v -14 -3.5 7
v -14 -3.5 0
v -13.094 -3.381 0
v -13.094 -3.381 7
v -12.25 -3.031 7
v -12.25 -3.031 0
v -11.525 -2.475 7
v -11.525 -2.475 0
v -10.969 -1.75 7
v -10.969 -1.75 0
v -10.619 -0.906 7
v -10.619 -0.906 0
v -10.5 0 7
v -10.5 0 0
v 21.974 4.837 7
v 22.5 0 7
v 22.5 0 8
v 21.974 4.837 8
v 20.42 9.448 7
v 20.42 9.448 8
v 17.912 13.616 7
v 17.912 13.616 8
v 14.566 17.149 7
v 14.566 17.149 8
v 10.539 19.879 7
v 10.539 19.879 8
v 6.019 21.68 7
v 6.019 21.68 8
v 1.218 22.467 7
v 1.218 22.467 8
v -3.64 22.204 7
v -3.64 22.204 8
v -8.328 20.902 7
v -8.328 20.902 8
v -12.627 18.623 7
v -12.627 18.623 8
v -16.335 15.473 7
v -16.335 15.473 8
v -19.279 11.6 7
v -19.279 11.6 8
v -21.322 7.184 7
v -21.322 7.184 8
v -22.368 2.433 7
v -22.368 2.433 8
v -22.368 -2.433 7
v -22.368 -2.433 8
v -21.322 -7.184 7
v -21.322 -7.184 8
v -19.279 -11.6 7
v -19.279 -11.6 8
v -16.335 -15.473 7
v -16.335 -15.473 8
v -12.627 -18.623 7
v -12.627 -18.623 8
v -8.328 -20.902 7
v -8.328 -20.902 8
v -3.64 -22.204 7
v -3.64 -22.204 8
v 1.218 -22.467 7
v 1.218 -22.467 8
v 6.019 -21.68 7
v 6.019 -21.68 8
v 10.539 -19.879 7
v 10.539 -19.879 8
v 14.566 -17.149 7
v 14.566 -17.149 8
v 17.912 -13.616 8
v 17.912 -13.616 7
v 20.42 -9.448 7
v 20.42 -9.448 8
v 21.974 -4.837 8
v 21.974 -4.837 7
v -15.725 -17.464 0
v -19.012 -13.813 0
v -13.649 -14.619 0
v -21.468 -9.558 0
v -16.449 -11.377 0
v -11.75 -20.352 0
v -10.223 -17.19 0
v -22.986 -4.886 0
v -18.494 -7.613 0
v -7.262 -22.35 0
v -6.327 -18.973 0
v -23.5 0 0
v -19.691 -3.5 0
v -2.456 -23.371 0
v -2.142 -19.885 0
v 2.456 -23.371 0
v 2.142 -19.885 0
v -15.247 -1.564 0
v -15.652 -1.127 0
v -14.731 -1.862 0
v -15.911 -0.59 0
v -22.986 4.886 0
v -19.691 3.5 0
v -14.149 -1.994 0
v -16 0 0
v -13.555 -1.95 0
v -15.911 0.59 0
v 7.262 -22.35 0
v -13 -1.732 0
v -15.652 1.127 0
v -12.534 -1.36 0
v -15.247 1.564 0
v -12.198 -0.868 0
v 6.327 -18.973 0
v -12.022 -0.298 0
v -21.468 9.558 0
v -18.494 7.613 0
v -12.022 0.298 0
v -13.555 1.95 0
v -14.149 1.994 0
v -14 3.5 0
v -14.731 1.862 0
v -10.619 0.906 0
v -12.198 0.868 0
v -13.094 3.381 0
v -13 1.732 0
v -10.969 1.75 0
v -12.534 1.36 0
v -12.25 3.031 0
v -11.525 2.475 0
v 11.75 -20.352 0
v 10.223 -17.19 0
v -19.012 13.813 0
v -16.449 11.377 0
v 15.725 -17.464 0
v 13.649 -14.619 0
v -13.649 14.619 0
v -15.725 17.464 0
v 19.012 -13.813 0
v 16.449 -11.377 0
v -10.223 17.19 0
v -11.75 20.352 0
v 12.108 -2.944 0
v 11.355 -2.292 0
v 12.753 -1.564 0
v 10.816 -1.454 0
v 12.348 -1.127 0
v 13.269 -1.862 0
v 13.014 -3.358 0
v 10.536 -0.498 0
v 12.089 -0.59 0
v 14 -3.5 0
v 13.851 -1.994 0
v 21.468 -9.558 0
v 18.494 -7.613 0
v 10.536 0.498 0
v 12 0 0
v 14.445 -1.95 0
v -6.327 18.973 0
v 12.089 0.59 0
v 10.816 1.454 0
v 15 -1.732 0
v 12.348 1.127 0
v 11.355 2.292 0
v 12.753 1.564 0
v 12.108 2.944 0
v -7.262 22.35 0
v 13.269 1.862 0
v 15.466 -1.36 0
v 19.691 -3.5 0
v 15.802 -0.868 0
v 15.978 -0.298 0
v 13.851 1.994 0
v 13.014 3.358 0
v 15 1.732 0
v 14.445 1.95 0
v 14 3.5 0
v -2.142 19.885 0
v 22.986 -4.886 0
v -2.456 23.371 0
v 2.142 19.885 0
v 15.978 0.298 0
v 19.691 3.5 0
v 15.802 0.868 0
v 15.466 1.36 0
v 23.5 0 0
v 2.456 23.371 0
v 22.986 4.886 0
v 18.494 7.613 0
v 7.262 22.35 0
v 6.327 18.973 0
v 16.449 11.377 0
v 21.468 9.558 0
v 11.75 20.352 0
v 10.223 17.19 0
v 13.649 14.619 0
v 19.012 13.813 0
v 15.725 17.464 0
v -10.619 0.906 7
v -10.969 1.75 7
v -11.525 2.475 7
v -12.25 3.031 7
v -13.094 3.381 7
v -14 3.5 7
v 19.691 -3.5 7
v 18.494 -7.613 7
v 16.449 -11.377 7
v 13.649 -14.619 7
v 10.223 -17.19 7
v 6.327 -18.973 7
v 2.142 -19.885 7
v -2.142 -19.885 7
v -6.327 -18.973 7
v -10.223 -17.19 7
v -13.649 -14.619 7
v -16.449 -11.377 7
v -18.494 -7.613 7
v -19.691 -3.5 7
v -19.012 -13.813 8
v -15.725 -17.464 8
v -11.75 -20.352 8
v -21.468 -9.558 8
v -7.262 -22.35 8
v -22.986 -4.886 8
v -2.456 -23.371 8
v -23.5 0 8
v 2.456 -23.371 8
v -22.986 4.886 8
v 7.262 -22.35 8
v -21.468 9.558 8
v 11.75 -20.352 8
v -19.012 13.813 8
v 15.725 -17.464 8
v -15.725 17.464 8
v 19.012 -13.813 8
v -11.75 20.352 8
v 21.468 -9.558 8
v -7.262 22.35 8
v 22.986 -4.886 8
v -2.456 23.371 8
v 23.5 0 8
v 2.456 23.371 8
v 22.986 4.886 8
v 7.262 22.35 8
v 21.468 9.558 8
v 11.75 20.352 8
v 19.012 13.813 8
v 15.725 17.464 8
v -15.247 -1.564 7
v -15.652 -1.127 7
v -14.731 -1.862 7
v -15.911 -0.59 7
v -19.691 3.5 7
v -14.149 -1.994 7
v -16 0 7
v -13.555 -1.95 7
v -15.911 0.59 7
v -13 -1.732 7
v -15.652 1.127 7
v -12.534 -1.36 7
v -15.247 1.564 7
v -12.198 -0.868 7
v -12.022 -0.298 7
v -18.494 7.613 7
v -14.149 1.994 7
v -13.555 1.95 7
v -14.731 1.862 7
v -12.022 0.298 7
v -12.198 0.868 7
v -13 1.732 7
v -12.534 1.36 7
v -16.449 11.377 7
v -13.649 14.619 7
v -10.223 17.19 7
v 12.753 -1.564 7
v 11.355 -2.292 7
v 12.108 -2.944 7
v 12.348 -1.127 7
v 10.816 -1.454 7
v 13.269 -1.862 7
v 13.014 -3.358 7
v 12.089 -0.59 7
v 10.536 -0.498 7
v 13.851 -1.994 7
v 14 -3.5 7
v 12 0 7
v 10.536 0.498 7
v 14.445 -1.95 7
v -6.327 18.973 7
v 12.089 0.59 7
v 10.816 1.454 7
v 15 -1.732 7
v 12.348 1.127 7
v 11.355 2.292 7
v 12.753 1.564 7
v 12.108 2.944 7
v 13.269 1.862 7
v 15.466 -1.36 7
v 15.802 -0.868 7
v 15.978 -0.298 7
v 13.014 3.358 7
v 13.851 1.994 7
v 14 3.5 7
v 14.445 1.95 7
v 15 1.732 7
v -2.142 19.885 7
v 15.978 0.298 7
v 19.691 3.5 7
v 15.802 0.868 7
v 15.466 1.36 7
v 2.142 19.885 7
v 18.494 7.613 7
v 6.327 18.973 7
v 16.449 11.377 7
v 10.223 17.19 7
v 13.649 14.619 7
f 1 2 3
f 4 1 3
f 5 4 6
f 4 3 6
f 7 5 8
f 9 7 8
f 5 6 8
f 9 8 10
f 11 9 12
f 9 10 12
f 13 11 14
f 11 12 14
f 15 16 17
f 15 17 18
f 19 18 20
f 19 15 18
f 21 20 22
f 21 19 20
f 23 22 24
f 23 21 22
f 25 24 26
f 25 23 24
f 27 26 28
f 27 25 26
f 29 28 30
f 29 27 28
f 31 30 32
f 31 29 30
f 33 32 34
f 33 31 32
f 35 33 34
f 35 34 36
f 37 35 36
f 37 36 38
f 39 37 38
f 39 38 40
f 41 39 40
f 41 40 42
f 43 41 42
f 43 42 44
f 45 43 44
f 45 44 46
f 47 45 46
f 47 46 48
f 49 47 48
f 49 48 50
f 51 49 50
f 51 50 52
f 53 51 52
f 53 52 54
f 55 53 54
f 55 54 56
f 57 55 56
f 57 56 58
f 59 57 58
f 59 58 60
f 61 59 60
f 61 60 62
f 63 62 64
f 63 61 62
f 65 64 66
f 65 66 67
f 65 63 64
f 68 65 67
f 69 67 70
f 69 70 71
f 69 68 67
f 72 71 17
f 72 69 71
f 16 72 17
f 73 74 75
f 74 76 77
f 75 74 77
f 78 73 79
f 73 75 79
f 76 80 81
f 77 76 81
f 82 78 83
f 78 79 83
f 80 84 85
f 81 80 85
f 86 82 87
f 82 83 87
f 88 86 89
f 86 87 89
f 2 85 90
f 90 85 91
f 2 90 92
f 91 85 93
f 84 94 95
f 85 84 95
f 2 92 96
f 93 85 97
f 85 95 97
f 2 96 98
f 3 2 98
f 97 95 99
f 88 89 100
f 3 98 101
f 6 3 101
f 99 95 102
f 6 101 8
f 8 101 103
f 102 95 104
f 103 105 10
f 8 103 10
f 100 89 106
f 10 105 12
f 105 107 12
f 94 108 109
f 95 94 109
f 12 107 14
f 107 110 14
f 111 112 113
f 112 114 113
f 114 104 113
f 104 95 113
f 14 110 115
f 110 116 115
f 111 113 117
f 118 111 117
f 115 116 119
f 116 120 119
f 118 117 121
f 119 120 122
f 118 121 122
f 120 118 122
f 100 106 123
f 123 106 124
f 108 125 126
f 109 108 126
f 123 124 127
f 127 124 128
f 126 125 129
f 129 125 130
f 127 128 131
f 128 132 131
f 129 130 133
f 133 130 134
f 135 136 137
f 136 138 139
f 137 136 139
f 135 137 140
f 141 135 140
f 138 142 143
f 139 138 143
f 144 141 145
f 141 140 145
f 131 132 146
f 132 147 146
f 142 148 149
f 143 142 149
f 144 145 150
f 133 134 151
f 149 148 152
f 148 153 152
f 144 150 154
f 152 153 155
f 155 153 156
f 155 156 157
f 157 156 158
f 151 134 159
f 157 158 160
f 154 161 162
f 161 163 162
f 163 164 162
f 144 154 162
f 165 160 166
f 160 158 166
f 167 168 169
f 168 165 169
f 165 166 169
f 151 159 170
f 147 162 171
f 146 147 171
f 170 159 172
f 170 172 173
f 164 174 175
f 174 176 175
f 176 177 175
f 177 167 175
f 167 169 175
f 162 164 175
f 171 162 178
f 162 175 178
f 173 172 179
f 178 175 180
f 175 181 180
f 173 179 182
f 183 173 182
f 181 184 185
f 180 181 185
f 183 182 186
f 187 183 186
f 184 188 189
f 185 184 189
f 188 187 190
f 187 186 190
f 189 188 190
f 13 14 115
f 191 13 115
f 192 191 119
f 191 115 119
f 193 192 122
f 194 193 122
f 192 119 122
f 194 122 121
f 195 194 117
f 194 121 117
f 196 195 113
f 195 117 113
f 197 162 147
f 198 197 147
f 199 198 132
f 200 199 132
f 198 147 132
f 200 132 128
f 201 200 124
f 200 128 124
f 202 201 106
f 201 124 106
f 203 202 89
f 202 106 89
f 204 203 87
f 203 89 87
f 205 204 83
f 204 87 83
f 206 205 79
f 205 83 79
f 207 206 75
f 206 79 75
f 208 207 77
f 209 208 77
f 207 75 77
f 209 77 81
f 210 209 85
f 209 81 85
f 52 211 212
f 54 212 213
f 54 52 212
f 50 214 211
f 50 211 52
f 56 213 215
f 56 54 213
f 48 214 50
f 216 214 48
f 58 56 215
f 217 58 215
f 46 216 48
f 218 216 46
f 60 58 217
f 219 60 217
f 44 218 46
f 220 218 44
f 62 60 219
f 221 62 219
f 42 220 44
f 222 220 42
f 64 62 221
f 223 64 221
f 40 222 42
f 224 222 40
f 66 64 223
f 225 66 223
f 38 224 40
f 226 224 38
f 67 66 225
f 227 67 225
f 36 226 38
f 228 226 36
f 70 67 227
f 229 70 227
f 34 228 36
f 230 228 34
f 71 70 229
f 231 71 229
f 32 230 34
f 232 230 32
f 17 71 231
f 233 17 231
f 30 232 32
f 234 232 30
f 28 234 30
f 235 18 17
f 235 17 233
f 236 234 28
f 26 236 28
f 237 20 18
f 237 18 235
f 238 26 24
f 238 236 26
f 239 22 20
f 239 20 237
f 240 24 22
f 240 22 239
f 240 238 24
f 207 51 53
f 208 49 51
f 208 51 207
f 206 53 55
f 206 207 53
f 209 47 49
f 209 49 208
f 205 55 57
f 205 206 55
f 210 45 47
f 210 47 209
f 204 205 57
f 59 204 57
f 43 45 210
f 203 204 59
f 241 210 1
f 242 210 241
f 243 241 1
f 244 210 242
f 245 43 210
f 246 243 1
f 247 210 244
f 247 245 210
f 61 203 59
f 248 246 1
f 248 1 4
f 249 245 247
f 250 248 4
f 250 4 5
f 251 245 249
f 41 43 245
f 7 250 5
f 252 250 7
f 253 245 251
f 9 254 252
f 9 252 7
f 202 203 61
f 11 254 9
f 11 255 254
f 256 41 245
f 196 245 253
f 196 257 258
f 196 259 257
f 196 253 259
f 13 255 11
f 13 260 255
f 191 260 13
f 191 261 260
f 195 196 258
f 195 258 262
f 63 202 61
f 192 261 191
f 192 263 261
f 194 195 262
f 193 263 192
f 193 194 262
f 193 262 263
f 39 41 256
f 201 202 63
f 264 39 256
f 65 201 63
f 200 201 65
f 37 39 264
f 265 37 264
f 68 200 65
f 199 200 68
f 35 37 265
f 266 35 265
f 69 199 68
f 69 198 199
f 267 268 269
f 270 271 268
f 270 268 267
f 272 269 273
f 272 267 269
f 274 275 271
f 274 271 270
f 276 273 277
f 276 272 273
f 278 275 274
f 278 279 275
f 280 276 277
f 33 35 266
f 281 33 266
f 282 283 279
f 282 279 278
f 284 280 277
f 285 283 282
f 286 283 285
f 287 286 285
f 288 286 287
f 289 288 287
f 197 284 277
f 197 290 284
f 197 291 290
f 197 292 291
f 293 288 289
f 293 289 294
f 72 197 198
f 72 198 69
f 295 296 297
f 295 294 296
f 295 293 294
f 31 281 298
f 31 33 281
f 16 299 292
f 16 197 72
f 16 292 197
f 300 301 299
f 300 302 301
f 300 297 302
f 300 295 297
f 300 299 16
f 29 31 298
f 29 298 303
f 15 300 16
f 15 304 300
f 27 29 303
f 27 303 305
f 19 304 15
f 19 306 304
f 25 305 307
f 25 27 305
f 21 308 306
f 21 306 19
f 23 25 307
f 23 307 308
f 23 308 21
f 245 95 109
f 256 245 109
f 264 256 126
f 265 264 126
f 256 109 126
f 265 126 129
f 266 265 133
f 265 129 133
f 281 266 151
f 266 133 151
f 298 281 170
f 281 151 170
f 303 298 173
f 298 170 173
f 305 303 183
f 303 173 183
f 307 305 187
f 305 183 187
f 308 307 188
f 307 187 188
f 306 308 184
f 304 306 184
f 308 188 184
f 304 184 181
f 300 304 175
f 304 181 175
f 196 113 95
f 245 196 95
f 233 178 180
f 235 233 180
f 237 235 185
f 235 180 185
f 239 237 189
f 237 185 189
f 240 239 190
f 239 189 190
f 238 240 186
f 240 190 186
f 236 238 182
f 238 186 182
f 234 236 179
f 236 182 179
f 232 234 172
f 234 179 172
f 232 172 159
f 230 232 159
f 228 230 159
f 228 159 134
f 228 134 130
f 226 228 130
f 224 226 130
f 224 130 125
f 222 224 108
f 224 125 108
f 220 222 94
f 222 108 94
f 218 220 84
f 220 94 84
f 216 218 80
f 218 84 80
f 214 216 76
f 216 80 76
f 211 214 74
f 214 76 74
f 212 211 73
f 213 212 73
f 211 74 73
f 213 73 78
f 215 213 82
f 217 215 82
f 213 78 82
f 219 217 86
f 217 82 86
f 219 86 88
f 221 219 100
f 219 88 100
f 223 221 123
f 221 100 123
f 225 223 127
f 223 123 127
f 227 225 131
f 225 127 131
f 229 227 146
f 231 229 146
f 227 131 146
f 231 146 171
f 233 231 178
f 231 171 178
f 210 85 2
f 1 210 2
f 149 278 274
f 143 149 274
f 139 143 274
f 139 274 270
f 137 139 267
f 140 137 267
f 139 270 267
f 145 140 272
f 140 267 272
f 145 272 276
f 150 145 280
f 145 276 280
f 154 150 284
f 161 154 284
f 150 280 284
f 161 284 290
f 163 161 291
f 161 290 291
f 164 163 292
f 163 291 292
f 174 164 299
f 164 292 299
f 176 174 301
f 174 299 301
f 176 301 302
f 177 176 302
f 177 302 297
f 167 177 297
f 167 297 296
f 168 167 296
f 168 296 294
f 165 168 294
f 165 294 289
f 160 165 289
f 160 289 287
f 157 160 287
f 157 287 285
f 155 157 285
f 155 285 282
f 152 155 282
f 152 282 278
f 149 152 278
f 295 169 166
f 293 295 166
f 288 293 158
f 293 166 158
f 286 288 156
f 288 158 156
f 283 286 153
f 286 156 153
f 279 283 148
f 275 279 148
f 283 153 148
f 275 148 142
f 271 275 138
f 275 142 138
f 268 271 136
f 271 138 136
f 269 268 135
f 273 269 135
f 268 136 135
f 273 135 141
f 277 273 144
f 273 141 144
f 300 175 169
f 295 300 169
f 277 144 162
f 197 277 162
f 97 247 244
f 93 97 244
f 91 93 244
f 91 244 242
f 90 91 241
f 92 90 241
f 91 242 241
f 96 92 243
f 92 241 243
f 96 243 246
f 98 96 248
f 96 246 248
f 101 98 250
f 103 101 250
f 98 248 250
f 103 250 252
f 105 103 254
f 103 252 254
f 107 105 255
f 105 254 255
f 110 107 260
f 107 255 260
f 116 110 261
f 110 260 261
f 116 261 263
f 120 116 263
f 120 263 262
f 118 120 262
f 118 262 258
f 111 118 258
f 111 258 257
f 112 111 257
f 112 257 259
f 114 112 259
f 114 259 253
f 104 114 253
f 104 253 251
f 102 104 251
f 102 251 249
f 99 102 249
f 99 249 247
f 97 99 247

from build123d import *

# Parameters (mm, degrees)
F0_R     = 22.5
F1_DEPTH = 7
F0_R_2   = 23.5
F2_DEPTH = 8
F3_D     = 4


with BuildPart() as f1:
    # F0 (on Top) → F1 (new body)
    with BuildSketch(Plane.XY):
        Circle(F0_R)
        with BuildLine():
            ThreePointArc((19.691369, 3.5), (19.922693, 1.756791), (20, 0))
            ThreePointArc((20, 0), (19.922693, -1.756791), (19.691369, -3.5))
            ThreePointArc((19.691369, -3.5), (0, -20), (-19.691369, -3.5))
            ThreePointArc((-19.691369, -3.5), (-20, 0), (-19.691369, 3.5))
            ThreePointArc((-19.691369, 3.5), (0, 20), (19.691369, 3.5))
        make_face(mode=Mode.SUBTRACT)
        with BuildLine():
            Line((-14, 3.5), (-19.691369, 3.5))
            ThreePointArc((-19.691369, 3.5), (-20, 0), (-19.691369, -3.5))
            Line((-19.691369, -3.5), (-14, -3.5))
            ThreePointArc((-14, -3.5), (-17.5, 0), (-14, 3.5))
        make_face()
        with BuildLine():
            ThreePointArc((-10.5, 0), (-11.525126, 2.474874), (-14, 3.5))
            ThreePointArc((-14, 3.5), (-17.5, 0), (-14, -3.5))
            ThreePointArc((-14, -3.5), (-11.525126, -2.474874), (-10.5, 0))
        make_face()
        with BuildLine():
            ThreePointArc((17.5, 0), (16.474874, 2.474874), (14, 3.5))
            ThreePointArc((14, 3.5), (10.5, 0), (14, -3.5))
            ThreePointArc((14, -3.5), (16.474874, -2.474874), (17.5, 0))
        make_face()
        with BuildLine():
            ThreePointArc((19.691369, -3.5), (19.922693, -1.756791), (20, 0))
            ThreePointArc((20, 0), (19.922693, 1.756791), (19.691369, 3.5))
            Line((19.691369, 3.5), (14, 3.5))
            ThreePointArc((14, 3.5), (16.474874, 2.474874), (17.5, 0))
            ThreePointArc((17.5, 0), (16.474874, -2.474874), (14, -3.5))
            Line((14, -3.5), (19.691369, -3.5))
        make_face()
    extrude(amount=F1_DEPTH)

    # F0 (on Top) → F2 (join)
    with BuildSketch(Plane.XY):
        Circle(F0_R_2)
        Circle(F0_R, mode=Mode.SUBTRACT)
    extrude(amount=F2_DEPTH)

    # F3 (through all)
    with Locations(Plane(origin=(0, 0, 0), x_dir=(1, 0, 0), z_dir=(0, 0, -1))):
        with Locations((-14, 0), (14, 0)):
            Hole(F3_D / 2)


solid = f1.part
